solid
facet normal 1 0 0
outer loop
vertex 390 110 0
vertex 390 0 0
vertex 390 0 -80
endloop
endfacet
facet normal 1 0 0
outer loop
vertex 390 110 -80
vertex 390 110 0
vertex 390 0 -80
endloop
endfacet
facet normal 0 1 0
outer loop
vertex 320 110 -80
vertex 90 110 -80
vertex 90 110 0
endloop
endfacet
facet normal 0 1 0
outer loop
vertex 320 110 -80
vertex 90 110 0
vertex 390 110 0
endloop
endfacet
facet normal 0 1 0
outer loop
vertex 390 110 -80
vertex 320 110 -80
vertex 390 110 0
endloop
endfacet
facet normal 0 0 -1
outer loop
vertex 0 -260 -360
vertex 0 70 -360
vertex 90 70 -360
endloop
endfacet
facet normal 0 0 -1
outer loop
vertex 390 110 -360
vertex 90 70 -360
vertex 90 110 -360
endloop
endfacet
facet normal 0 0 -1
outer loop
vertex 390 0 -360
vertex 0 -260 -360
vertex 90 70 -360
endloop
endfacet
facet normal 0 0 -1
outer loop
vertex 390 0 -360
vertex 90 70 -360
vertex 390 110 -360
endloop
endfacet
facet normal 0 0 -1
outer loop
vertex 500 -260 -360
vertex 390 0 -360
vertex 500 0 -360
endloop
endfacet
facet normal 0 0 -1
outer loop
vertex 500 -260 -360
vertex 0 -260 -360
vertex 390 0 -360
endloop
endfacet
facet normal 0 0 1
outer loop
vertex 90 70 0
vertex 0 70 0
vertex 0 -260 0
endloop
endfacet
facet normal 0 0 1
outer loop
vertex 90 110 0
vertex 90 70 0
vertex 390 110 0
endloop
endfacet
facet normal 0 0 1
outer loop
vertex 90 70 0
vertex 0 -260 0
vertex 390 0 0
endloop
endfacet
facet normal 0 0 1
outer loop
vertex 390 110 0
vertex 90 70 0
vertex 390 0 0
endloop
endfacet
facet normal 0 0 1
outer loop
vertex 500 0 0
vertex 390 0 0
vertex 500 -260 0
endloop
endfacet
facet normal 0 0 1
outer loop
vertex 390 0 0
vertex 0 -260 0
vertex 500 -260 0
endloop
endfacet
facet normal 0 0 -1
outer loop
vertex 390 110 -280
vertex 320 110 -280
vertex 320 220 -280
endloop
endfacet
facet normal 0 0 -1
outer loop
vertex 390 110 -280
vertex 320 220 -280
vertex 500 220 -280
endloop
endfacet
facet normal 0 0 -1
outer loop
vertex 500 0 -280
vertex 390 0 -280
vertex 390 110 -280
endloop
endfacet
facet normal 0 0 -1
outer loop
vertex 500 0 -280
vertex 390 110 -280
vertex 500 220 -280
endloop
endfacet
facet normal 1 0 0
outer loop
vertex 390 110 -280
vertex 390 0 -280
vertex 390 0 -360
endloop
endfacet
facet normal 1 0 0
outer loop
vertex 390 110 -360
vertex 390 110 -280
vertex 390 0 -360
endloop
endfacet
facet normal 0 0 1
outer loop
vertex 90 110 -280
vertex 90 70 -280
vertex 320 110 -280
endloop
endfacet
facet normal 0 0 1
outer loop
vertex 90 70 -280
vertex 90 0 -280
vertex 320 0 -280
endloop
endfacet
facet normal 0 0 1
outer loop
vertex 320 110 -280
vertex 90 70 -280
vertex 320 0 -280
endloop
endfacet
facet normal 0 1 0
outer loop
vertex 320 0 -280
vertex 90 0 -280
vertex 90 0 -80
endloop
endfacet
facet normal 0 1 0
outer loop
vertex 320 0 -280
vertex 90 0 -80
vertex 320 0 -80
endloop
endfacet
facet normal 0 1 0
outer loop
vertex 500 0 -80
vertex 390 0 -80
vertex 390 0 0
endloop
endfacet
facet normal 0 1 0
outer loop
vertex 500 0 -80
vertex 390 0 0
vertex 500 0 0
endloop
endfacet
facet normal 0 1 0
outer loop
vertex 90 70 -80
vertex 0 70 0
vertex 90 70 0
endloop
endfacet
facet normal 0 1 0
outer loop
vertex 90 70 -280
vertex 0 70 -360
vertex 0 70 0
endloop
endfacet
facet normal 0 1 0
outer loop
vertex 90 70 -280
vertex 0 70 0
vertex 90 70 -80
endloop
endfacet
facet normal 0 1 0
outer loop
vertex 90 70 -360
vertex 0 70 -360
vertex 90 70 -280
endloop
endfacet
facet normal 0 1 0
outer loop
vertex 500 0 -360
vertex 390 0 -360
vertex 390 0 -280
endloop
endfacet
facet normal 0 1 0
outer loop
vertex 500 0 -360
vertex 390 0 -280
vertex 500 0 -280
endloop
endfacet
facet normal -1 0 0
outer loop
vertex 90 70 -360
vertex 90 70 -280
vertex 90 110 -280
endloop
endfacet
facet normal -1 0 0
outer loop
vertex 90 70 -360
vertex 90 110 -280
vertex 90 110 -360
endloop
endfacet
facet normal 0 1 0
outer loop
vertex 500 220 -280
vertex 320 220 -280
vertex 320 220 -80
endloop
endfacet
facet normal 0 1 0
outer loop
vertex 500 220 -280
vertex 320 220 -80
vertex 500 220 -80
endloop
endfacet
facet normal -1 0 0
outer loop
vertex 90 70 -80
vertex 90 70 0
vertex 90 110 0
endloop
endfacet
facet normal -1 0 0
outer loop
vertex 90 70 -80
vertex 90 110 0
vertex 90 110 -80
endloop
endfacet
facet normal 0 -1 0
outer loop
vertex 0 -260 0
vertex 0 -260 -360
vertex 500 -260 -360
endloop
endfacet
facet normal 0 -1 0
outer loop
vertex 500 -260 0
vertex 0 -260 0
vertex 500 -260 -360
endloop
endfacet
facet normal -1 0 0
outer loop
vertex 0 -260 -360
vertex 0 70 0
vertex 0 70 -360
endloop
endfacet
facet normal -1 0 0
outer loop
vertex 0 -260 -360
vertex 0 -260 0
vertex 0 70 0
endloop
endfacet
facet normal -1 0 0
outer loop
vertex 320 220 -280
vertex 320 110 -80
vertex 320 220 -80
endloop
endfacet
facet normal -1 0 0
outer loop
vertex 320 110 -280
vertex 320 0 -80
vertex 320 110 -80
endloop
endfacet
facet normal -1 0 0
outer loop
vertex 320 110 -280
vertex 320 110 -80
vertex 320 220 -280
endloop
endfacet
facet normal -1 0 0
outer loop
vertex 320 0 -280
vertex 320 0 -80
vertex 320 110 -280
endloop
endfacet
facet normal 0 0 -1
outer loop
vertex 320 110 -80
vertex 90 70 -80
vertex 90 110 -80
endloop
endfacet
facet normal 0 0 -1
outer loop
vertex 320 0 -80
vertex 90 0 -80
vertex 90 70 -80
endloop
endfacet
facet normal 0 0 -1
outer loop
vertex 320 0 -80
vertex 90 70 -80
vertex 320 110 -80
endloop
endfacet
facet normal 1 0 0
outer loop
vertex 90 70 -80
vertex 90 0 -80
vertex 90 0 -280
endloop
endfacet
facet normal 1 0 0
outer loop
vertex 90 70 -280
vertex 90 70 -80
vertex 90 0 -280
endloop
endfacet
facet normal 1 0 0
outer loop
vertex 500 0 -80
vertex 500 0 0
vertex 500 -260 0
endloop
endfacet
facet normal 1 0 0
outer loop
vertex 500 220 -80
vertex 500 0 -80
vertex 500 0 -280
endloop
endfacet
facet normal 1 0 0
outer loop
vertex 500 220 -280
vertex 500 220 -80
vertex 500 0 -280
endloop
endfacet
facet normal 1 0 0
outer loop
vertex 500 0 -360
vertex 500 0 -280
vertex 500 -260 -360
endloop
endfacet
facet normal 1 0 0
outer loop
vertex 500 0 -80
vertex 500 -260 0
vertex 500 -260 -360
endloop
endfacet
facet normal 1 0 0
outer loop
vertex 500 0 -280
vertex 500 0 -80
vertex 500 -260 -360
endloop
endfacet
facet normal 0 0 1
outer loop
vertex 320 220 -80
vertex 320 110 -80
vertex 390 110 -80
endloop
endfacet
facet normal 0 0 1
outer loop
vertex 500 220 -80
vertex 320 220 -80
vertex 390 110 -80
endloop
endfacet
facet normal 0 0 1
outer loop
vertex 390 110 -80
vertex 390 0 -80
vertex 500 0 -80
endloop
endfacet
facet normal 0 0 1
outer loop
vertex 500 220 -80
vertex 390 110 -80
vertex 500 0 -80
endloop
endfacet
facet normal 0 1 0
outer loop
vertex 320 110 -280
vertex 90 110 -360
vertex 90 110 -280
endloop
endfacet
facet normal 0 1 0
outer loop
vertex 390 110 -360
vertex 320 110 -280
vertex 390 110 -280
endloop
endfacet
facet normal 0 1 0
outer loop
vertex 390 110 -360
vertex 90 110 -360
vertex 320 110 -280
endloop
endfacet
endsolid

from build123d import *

# Parameters (mm, degrees)
SKETCH1_W           = 500
SKETCH1_H           = 360
BOSS_EXTRUDE1_DEPTH = 260
SKETCH2_W           = 90
SKETCH2_H           = 360
BOSS_EXTRUDE3_DEPTH = 70
SKETCH3_W           = 300
SKETCH3_H           = 80
BOSS_EXTRUDE4_DEPTH = 110
SKETCH4_W           = 180
SKETCH4_H           = 200
BOSS_EXTRUDE5_DEPTH = 220


with BuildPart() as part:
    # Sketch1 → Boss-Extrude1 (new body)
    with BuildSketch(Plane(origin=(0, 0, 0), x_dir=(1, 0, 0), z_dir=(0, 1, 0))):
        with Locations((250, 180)):
            Rectangle(SKETCH1_W, SKETCH1_H)
    extrude(amount=-BOSS_EXTRUDE1_DEPTH)

    # Sketch2 → Boss-Extrude3 (add)
    with BuildSketch(Plane(origin=(0, 0, 0), x_dir=(1, 0, 0), z_dir=(0, 1, 0))):
        with Locations((45, 180)):
            Rectangle(SKETCH2_W, SKETCH2_H)
    extrude(amount=BOSS_EXTRUDE3_DEPTH)

    # Sketch3 → Boss-Extrude4 (add)
    with BuildSketch(Plane(origin=(0, 0, 0), x_dir=(1, 0, 0), z_dir=(0, 1, 0))):
        with Locations((240, 320)):
            Rectangle(SKETCH3_W, SKETCH3_H)
        with Locations((240, 40)):
            Rectangle(SKETCH3_W, SKETCH3_H)
    extrude(amount=BOSS_EXTRUDE4_DEPTH)

    # Sketch4 → Boss-Extrude5 (add)
    with BuildSketch(Plane(origin=(0, 0, 0), x_dir=(1, 0, 0), z_dir=(0, 1, 0))):
        with Locations((410, 180)):
            Rectangle(SKETCH4_W, SKETCH4_H)
    extrude(amount=BOSS_EXTRUDE5_DEPTH)


solid = part.part
